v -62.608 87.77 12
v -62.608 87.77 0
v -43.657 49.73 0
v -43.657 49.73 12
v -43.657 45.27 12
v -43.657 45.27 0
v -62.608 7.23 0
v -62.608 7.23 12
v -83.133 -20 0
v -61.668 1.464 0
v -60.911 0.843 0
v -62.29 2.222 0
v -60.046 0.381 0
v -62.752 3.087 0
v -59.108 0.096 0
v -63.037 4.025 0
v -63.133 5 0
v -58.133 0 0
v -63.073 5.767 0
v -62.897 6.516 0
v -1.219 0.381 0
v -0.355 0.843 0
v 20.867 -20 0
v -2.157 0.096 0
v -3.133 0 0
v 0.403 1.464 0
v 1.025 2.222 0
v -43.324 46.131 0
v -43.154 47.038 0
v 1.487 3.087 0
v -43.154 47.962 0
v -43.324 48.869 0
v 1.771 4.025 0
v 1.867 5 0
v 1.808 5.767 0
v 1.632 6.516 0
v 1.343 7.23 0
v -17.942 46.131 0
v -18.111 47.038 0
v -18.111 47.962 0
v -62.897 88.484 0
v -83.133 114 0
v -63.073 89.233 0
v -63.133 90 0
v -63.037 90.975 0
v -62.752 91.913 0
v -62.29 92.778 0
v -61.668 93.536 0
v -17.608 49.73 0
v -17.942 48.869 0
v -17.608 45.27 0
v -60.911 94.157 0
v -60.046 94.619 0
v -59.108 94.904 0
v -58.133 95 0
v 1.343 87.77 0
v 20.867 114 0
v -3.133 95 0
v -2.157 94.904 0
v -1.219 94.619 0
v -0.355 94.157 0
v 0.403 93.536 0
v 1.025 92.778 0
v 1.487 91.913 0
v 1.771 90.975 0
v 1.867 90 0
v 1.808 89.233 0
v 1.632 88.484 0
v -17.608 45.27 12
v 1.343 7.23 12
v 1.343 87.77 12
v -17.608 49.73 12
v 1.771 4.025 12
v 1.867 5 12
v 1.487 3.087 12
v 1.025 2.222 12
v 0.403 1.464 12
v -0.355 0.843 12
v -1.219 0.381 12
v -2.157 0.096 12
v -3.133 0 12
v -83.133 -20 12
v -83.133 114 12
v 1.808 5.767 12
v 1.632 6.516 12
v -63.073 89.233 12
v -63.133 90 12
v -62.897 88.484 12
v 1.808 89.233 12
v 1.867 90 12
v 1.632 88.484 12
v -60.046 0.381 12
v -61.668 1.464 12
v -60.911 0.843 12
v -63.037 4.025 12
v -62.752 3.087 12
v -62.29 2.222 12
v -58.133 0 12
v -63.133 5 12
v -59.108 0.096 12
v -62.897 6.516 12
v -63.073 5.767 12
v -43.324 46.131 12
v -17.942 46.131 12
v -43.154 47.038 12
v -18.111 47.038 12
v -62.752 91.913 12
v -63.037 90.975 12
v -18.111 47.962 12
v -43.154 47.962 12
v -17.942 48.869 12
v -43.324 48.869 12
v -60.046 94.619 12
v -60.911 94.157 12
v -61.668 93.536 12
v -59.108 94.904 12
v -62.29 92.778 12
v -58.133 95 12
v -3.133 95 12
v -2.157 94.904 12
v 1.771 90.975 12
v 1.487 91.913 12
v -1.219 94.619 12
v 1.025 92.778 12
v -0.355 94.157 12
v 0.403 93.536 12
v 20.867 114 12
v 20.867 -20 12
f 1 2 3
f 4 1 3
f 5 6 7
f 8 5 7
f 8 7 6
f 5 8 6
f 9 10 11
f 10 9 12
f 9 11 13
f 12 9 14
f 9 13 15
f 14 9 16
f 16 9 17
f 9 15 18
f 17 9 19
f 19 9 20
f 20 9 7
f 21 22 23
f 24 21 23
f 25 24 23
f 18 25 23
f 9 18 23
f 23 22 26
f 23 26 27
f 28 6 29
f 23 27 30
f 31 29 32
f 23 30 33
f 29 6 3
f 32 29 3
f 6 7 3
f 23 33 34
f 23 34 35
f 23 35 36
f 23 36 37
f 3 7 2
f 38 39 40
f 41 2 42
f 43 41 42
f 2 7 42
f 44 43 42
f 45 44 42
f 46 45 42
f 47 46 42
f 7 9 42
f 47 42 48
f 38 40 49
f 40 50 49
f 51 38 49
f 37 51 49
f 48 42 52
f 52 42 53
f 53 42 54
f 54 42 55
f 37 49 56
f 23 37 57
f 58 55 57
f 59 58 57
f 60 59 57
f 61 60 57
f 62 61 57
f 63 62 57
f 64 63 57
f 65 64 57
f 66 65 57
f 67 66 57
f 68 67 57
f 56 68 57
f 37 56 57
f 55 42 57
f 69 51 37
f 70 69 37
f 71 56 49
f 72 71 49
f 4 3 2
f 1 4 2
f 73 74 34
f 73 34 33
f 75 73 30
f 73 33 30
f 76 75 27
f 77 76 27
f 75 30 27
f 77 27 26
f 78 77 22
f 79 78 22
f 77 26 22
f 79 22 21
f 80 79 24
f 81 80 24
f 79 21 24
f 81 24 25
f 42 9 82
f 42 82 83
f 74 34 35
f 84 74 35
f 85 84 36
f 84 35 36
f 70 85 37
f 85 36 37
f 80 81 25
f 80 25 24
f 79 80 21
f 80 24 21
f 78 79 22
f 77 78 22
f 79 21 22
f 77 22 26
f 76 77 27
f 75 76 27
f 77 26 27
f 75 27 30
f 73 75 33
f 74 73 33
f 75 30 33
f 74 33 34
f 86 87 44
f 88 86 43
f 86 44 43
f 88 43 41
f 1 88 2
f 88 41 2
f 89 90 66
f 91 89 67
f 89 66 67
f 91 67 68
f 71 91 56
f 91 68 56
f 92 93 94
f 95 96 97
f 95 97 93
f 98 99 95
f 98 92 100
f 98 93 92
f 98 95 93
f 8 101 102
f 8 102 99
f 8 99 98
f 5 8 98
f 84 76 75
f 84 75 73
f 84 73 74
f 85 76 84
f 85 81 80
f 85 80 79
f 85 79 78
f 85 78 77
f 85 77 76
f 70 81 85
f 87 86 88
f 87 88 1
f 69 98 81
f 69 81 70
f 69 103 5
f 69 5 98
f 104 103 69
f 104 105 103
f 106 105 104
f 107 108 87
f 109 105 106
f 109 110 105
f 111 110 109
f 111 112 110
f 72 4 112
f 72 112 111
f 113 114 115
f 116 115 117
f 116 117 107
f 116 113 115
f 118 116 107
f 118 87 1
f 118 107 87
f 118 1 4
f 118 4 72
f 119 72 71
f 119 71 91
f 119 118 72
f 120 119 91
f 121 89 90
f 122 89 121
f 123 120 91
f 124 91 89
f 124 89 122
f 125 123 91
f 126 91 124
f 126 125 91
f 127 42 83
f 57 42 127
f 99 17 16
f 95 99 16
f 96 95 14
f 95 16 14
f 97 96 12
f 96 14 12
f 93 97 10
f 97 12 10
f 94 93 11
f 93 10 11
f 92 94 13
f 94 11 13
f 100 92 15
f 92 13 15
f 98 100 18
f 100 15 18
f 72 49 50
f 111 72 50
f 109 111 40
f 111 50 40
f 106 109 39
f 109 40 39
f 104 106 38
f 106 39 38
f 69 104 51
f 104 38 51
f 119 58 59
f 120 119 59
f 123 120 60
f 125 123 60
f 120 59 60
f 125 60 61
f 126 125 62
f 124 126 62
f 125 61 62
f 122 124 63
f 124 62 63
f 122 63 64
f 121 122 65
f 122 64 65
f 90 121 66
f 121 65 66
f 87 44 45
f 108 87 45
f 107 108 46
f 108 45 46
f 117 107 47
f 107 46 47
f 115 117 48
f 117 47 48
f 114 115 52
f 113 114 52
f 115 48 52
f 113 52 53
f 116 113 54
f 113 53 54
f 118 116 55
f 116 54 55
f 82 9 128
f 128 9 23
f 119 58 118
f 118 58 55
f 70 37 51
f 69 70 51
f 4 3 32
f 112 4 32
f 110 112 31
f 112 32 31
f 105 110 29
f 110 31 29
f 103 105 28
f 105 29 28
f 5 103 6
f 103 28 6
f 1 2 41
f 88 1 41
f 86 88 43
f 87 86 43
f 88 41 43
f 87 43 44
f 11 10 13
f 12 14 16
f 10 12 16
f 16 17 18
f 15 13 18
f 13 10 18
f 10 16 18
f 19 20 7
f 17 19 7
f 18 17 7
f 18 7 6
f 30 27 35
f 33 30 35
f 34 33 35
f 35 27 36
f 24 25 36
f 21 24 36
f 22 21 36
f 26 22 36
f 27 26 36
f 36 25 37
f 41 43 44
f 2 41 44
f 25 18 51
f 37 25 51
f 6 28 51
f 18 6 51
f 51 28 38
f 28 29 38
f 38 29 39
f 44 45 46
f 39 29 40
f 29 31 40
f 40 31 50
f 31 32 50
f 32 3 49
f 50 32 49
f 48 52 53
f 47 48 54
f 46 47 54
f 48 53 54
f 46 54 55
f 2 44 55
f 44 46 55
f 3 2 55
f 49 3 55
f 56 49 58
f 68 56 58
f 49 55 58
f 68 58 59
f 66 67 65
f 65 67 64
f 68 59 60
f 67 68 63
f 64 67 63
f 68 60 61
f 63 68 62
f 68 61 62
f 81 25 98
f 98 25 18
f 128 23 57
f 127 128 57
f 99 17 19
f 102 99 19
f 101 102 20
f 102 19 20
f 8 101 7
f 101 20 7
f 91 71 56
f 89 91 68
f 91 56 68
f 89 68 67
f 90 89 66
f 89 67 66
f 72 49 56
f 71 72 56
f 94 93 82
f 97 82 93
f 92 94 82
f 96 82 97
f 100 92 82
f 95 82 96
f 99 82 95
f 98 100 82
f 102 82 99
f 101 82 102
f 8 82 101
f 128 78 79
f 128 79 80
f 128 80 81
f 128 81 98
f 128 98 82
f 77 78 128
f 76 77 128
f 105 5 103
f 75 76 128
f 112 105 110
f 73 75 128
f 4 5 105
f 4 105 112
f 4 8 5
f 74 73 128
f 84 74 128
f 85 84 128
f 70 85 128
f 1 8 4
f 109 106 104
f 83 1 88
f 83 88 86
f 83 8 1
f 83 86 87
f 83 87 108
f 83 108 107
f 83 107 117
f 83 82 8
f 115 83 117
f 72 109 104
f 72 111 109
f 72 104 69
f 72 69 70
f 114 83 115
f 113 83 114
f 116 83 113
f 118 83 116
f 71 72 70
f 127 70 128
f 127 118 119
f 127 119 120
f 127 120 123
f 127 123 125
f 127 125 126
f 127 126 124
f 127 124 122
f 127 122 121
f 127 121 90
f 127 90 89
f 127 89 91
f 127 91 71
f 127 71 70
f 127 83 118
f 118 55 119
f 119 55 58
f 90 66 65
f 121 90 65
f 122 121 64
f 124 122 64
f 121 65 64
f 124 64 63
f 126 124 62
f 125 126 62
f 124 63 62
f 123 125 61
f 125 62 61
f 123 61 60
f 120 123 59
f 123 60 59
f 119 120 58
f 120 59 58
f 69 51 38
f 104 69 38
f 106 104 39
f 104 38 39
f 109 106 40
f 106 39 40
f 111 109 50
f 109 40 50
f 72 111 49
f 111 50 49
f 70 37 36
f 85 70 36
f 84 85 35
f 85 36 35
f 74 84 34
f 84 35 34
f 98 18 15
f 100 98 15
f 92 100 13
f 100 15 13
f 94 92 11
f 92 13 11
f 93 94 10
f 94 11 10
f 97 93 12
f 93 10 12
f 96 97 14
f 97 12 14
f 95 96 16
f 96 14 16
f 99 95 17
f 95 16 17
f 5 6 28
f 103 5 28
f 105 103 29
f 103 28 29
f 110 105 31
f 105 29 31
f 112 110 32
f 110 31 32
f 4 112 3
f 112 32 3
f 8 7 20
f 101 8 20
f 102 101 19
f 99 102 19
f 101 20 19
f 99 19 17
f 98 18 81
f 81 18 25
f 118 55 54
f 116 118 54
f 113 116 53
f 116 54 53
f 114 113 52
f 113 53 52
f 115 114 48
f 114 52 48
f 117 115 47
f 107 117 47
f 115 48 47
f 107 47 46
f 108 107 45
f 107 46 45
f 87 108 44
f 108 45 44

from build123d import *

# Parameters (mm, degrees)
F1_DEPTH = 12
F0_W     = 104
F0_H     = 134
F2_DEPTH = 12


with BuildPart() as f1:
    # F0 (on Top) → F1 (new body)
    with BuildSketch(Plane.XY):
        with BuildLine():
            Line((-58.132685, 0), (-3.132685, 0))
            ThreePointArc((-3.132685, 0), (0.402849, 1.464466), (1.867315, 5))
            ThreePointArc((1.867315, 5), (1.7344, 6.145197), (1.342724, 7.229508))
            Line((1.342724, 7.229508), (-17.608095, 45.270492))
            ThreePointArc((-17.608095, 45.270492), (-18.132685, 47.5), (-17.608095, 49.729508))
            Line((-17.608095, 49.729508), (1.342724, 87.770492))
            ThreePointArc((1.342724, 87.770492), (1.7344, 88.854803), (1.867315, 90))
            ThreePointArc((1.867315, 90), (0.402849, 93.535534), (-3.132685, 95))
            Line((-3.132685, 95), (-58.132685, 95))
            ThreePointArc((-58.132685, 95), (-61.668219, 93.535534), (-63.132685, 90))
            ThreePointArc((-63.132685, 90), (-62.999771, 88.854803), (-62.608095, 87.770492))
            Line((-62.608095, 87.770492), (-43.657276, 49.729508))
            ThreePointArc((-43.657276, 49.729508), (-43.132685, 47.5), (-43.657276, 45.270492))
            Line((-43.657276, 45.270492), (-62.608095, 7.229508))
            ThreePointArc((-62.608095, 7.229508), (-62.999771, 6.145197), (-63.132685, 5))
            ThreePointArc((-63.132685, 5), (-61.668219, 1.464466), (-58.132685, 0))
        make_face()
    extrude(amount=F1_DEPTH)


with BuildPart() as f2:
    # F0 (on Top) → F2 (new body)
    with BuildSketch(Plane.XY):
        with Locations((-31.132685, 47)):
            Rectangle(F0_W, F0_H)
        with BuildLine():
            ThreePointArc((1.867315, 5), (0.402849, 1.464466), (-3.132685, 0))
            Line((-3.132685, 0), (-58.132685, 0))
            ThreePointArc((-58.132685, 0), (-61.668219, 1.464466), (-63.132685, 5))
            Line((-63.132685, 5), (-63.132685, 90))
            ThreePointArc((-63.132685, 90), (-61.668219, 93.535534), (-58.132685, 95))
            Line((-58.132685, 95), (-3.132685, 95))
            ThreePointArc((-3.132685, 95), (0.402849, 93.535534), (1.867315, 90))
            Line((1.867315, 90), (1.867315, 5))
        make_face(mode=Mode.SUBTRACT)
        with BuildLine():
            Line((-63.132685, 90), (-63.132685, 5))
            ThreePointArc((-63.132685, 5), (-62.999771, 6.145197), (-62.608095, 7.229508))
            Line((-62.608095, 7.229508), (-43.657276, 45.270492))
            ThreePointArc((-43.657276, 45.270492), (-43.132685, 47.5), (-43.657276, 49.729508))
            Line((-43.657276, 49.729508), (-62.608095, 87.770492))
            ThreePointArc((-62.608095, 87.770492), (-62.999771, 88.854803), (-63.132685, 90))
        make_face()
        with BuildLine():
            ThreePointArc((1.342724, 7.229508), (1.7344, 6.145197), (1.867315, 5))
            Line((1.867315, 5), (1.867315, 90))
            ThreePointArc((1.867315, 90), (1.7344, 88.854803), (1.342724, 87.770492))
            Line((1.342724, 87.770492), (-17.608095, 49.729508))
            ThreePointArc((-17.608095, 49.729508), (-18.132685, 47.5), (-17.608095, 45.270492))
            Line((-17.608095, 45.270492), (1.342724, 7.229508))
        make_face()
    extrude(amount=F2_DEPTH)


solid = Compound([f1.part, f2.part])
